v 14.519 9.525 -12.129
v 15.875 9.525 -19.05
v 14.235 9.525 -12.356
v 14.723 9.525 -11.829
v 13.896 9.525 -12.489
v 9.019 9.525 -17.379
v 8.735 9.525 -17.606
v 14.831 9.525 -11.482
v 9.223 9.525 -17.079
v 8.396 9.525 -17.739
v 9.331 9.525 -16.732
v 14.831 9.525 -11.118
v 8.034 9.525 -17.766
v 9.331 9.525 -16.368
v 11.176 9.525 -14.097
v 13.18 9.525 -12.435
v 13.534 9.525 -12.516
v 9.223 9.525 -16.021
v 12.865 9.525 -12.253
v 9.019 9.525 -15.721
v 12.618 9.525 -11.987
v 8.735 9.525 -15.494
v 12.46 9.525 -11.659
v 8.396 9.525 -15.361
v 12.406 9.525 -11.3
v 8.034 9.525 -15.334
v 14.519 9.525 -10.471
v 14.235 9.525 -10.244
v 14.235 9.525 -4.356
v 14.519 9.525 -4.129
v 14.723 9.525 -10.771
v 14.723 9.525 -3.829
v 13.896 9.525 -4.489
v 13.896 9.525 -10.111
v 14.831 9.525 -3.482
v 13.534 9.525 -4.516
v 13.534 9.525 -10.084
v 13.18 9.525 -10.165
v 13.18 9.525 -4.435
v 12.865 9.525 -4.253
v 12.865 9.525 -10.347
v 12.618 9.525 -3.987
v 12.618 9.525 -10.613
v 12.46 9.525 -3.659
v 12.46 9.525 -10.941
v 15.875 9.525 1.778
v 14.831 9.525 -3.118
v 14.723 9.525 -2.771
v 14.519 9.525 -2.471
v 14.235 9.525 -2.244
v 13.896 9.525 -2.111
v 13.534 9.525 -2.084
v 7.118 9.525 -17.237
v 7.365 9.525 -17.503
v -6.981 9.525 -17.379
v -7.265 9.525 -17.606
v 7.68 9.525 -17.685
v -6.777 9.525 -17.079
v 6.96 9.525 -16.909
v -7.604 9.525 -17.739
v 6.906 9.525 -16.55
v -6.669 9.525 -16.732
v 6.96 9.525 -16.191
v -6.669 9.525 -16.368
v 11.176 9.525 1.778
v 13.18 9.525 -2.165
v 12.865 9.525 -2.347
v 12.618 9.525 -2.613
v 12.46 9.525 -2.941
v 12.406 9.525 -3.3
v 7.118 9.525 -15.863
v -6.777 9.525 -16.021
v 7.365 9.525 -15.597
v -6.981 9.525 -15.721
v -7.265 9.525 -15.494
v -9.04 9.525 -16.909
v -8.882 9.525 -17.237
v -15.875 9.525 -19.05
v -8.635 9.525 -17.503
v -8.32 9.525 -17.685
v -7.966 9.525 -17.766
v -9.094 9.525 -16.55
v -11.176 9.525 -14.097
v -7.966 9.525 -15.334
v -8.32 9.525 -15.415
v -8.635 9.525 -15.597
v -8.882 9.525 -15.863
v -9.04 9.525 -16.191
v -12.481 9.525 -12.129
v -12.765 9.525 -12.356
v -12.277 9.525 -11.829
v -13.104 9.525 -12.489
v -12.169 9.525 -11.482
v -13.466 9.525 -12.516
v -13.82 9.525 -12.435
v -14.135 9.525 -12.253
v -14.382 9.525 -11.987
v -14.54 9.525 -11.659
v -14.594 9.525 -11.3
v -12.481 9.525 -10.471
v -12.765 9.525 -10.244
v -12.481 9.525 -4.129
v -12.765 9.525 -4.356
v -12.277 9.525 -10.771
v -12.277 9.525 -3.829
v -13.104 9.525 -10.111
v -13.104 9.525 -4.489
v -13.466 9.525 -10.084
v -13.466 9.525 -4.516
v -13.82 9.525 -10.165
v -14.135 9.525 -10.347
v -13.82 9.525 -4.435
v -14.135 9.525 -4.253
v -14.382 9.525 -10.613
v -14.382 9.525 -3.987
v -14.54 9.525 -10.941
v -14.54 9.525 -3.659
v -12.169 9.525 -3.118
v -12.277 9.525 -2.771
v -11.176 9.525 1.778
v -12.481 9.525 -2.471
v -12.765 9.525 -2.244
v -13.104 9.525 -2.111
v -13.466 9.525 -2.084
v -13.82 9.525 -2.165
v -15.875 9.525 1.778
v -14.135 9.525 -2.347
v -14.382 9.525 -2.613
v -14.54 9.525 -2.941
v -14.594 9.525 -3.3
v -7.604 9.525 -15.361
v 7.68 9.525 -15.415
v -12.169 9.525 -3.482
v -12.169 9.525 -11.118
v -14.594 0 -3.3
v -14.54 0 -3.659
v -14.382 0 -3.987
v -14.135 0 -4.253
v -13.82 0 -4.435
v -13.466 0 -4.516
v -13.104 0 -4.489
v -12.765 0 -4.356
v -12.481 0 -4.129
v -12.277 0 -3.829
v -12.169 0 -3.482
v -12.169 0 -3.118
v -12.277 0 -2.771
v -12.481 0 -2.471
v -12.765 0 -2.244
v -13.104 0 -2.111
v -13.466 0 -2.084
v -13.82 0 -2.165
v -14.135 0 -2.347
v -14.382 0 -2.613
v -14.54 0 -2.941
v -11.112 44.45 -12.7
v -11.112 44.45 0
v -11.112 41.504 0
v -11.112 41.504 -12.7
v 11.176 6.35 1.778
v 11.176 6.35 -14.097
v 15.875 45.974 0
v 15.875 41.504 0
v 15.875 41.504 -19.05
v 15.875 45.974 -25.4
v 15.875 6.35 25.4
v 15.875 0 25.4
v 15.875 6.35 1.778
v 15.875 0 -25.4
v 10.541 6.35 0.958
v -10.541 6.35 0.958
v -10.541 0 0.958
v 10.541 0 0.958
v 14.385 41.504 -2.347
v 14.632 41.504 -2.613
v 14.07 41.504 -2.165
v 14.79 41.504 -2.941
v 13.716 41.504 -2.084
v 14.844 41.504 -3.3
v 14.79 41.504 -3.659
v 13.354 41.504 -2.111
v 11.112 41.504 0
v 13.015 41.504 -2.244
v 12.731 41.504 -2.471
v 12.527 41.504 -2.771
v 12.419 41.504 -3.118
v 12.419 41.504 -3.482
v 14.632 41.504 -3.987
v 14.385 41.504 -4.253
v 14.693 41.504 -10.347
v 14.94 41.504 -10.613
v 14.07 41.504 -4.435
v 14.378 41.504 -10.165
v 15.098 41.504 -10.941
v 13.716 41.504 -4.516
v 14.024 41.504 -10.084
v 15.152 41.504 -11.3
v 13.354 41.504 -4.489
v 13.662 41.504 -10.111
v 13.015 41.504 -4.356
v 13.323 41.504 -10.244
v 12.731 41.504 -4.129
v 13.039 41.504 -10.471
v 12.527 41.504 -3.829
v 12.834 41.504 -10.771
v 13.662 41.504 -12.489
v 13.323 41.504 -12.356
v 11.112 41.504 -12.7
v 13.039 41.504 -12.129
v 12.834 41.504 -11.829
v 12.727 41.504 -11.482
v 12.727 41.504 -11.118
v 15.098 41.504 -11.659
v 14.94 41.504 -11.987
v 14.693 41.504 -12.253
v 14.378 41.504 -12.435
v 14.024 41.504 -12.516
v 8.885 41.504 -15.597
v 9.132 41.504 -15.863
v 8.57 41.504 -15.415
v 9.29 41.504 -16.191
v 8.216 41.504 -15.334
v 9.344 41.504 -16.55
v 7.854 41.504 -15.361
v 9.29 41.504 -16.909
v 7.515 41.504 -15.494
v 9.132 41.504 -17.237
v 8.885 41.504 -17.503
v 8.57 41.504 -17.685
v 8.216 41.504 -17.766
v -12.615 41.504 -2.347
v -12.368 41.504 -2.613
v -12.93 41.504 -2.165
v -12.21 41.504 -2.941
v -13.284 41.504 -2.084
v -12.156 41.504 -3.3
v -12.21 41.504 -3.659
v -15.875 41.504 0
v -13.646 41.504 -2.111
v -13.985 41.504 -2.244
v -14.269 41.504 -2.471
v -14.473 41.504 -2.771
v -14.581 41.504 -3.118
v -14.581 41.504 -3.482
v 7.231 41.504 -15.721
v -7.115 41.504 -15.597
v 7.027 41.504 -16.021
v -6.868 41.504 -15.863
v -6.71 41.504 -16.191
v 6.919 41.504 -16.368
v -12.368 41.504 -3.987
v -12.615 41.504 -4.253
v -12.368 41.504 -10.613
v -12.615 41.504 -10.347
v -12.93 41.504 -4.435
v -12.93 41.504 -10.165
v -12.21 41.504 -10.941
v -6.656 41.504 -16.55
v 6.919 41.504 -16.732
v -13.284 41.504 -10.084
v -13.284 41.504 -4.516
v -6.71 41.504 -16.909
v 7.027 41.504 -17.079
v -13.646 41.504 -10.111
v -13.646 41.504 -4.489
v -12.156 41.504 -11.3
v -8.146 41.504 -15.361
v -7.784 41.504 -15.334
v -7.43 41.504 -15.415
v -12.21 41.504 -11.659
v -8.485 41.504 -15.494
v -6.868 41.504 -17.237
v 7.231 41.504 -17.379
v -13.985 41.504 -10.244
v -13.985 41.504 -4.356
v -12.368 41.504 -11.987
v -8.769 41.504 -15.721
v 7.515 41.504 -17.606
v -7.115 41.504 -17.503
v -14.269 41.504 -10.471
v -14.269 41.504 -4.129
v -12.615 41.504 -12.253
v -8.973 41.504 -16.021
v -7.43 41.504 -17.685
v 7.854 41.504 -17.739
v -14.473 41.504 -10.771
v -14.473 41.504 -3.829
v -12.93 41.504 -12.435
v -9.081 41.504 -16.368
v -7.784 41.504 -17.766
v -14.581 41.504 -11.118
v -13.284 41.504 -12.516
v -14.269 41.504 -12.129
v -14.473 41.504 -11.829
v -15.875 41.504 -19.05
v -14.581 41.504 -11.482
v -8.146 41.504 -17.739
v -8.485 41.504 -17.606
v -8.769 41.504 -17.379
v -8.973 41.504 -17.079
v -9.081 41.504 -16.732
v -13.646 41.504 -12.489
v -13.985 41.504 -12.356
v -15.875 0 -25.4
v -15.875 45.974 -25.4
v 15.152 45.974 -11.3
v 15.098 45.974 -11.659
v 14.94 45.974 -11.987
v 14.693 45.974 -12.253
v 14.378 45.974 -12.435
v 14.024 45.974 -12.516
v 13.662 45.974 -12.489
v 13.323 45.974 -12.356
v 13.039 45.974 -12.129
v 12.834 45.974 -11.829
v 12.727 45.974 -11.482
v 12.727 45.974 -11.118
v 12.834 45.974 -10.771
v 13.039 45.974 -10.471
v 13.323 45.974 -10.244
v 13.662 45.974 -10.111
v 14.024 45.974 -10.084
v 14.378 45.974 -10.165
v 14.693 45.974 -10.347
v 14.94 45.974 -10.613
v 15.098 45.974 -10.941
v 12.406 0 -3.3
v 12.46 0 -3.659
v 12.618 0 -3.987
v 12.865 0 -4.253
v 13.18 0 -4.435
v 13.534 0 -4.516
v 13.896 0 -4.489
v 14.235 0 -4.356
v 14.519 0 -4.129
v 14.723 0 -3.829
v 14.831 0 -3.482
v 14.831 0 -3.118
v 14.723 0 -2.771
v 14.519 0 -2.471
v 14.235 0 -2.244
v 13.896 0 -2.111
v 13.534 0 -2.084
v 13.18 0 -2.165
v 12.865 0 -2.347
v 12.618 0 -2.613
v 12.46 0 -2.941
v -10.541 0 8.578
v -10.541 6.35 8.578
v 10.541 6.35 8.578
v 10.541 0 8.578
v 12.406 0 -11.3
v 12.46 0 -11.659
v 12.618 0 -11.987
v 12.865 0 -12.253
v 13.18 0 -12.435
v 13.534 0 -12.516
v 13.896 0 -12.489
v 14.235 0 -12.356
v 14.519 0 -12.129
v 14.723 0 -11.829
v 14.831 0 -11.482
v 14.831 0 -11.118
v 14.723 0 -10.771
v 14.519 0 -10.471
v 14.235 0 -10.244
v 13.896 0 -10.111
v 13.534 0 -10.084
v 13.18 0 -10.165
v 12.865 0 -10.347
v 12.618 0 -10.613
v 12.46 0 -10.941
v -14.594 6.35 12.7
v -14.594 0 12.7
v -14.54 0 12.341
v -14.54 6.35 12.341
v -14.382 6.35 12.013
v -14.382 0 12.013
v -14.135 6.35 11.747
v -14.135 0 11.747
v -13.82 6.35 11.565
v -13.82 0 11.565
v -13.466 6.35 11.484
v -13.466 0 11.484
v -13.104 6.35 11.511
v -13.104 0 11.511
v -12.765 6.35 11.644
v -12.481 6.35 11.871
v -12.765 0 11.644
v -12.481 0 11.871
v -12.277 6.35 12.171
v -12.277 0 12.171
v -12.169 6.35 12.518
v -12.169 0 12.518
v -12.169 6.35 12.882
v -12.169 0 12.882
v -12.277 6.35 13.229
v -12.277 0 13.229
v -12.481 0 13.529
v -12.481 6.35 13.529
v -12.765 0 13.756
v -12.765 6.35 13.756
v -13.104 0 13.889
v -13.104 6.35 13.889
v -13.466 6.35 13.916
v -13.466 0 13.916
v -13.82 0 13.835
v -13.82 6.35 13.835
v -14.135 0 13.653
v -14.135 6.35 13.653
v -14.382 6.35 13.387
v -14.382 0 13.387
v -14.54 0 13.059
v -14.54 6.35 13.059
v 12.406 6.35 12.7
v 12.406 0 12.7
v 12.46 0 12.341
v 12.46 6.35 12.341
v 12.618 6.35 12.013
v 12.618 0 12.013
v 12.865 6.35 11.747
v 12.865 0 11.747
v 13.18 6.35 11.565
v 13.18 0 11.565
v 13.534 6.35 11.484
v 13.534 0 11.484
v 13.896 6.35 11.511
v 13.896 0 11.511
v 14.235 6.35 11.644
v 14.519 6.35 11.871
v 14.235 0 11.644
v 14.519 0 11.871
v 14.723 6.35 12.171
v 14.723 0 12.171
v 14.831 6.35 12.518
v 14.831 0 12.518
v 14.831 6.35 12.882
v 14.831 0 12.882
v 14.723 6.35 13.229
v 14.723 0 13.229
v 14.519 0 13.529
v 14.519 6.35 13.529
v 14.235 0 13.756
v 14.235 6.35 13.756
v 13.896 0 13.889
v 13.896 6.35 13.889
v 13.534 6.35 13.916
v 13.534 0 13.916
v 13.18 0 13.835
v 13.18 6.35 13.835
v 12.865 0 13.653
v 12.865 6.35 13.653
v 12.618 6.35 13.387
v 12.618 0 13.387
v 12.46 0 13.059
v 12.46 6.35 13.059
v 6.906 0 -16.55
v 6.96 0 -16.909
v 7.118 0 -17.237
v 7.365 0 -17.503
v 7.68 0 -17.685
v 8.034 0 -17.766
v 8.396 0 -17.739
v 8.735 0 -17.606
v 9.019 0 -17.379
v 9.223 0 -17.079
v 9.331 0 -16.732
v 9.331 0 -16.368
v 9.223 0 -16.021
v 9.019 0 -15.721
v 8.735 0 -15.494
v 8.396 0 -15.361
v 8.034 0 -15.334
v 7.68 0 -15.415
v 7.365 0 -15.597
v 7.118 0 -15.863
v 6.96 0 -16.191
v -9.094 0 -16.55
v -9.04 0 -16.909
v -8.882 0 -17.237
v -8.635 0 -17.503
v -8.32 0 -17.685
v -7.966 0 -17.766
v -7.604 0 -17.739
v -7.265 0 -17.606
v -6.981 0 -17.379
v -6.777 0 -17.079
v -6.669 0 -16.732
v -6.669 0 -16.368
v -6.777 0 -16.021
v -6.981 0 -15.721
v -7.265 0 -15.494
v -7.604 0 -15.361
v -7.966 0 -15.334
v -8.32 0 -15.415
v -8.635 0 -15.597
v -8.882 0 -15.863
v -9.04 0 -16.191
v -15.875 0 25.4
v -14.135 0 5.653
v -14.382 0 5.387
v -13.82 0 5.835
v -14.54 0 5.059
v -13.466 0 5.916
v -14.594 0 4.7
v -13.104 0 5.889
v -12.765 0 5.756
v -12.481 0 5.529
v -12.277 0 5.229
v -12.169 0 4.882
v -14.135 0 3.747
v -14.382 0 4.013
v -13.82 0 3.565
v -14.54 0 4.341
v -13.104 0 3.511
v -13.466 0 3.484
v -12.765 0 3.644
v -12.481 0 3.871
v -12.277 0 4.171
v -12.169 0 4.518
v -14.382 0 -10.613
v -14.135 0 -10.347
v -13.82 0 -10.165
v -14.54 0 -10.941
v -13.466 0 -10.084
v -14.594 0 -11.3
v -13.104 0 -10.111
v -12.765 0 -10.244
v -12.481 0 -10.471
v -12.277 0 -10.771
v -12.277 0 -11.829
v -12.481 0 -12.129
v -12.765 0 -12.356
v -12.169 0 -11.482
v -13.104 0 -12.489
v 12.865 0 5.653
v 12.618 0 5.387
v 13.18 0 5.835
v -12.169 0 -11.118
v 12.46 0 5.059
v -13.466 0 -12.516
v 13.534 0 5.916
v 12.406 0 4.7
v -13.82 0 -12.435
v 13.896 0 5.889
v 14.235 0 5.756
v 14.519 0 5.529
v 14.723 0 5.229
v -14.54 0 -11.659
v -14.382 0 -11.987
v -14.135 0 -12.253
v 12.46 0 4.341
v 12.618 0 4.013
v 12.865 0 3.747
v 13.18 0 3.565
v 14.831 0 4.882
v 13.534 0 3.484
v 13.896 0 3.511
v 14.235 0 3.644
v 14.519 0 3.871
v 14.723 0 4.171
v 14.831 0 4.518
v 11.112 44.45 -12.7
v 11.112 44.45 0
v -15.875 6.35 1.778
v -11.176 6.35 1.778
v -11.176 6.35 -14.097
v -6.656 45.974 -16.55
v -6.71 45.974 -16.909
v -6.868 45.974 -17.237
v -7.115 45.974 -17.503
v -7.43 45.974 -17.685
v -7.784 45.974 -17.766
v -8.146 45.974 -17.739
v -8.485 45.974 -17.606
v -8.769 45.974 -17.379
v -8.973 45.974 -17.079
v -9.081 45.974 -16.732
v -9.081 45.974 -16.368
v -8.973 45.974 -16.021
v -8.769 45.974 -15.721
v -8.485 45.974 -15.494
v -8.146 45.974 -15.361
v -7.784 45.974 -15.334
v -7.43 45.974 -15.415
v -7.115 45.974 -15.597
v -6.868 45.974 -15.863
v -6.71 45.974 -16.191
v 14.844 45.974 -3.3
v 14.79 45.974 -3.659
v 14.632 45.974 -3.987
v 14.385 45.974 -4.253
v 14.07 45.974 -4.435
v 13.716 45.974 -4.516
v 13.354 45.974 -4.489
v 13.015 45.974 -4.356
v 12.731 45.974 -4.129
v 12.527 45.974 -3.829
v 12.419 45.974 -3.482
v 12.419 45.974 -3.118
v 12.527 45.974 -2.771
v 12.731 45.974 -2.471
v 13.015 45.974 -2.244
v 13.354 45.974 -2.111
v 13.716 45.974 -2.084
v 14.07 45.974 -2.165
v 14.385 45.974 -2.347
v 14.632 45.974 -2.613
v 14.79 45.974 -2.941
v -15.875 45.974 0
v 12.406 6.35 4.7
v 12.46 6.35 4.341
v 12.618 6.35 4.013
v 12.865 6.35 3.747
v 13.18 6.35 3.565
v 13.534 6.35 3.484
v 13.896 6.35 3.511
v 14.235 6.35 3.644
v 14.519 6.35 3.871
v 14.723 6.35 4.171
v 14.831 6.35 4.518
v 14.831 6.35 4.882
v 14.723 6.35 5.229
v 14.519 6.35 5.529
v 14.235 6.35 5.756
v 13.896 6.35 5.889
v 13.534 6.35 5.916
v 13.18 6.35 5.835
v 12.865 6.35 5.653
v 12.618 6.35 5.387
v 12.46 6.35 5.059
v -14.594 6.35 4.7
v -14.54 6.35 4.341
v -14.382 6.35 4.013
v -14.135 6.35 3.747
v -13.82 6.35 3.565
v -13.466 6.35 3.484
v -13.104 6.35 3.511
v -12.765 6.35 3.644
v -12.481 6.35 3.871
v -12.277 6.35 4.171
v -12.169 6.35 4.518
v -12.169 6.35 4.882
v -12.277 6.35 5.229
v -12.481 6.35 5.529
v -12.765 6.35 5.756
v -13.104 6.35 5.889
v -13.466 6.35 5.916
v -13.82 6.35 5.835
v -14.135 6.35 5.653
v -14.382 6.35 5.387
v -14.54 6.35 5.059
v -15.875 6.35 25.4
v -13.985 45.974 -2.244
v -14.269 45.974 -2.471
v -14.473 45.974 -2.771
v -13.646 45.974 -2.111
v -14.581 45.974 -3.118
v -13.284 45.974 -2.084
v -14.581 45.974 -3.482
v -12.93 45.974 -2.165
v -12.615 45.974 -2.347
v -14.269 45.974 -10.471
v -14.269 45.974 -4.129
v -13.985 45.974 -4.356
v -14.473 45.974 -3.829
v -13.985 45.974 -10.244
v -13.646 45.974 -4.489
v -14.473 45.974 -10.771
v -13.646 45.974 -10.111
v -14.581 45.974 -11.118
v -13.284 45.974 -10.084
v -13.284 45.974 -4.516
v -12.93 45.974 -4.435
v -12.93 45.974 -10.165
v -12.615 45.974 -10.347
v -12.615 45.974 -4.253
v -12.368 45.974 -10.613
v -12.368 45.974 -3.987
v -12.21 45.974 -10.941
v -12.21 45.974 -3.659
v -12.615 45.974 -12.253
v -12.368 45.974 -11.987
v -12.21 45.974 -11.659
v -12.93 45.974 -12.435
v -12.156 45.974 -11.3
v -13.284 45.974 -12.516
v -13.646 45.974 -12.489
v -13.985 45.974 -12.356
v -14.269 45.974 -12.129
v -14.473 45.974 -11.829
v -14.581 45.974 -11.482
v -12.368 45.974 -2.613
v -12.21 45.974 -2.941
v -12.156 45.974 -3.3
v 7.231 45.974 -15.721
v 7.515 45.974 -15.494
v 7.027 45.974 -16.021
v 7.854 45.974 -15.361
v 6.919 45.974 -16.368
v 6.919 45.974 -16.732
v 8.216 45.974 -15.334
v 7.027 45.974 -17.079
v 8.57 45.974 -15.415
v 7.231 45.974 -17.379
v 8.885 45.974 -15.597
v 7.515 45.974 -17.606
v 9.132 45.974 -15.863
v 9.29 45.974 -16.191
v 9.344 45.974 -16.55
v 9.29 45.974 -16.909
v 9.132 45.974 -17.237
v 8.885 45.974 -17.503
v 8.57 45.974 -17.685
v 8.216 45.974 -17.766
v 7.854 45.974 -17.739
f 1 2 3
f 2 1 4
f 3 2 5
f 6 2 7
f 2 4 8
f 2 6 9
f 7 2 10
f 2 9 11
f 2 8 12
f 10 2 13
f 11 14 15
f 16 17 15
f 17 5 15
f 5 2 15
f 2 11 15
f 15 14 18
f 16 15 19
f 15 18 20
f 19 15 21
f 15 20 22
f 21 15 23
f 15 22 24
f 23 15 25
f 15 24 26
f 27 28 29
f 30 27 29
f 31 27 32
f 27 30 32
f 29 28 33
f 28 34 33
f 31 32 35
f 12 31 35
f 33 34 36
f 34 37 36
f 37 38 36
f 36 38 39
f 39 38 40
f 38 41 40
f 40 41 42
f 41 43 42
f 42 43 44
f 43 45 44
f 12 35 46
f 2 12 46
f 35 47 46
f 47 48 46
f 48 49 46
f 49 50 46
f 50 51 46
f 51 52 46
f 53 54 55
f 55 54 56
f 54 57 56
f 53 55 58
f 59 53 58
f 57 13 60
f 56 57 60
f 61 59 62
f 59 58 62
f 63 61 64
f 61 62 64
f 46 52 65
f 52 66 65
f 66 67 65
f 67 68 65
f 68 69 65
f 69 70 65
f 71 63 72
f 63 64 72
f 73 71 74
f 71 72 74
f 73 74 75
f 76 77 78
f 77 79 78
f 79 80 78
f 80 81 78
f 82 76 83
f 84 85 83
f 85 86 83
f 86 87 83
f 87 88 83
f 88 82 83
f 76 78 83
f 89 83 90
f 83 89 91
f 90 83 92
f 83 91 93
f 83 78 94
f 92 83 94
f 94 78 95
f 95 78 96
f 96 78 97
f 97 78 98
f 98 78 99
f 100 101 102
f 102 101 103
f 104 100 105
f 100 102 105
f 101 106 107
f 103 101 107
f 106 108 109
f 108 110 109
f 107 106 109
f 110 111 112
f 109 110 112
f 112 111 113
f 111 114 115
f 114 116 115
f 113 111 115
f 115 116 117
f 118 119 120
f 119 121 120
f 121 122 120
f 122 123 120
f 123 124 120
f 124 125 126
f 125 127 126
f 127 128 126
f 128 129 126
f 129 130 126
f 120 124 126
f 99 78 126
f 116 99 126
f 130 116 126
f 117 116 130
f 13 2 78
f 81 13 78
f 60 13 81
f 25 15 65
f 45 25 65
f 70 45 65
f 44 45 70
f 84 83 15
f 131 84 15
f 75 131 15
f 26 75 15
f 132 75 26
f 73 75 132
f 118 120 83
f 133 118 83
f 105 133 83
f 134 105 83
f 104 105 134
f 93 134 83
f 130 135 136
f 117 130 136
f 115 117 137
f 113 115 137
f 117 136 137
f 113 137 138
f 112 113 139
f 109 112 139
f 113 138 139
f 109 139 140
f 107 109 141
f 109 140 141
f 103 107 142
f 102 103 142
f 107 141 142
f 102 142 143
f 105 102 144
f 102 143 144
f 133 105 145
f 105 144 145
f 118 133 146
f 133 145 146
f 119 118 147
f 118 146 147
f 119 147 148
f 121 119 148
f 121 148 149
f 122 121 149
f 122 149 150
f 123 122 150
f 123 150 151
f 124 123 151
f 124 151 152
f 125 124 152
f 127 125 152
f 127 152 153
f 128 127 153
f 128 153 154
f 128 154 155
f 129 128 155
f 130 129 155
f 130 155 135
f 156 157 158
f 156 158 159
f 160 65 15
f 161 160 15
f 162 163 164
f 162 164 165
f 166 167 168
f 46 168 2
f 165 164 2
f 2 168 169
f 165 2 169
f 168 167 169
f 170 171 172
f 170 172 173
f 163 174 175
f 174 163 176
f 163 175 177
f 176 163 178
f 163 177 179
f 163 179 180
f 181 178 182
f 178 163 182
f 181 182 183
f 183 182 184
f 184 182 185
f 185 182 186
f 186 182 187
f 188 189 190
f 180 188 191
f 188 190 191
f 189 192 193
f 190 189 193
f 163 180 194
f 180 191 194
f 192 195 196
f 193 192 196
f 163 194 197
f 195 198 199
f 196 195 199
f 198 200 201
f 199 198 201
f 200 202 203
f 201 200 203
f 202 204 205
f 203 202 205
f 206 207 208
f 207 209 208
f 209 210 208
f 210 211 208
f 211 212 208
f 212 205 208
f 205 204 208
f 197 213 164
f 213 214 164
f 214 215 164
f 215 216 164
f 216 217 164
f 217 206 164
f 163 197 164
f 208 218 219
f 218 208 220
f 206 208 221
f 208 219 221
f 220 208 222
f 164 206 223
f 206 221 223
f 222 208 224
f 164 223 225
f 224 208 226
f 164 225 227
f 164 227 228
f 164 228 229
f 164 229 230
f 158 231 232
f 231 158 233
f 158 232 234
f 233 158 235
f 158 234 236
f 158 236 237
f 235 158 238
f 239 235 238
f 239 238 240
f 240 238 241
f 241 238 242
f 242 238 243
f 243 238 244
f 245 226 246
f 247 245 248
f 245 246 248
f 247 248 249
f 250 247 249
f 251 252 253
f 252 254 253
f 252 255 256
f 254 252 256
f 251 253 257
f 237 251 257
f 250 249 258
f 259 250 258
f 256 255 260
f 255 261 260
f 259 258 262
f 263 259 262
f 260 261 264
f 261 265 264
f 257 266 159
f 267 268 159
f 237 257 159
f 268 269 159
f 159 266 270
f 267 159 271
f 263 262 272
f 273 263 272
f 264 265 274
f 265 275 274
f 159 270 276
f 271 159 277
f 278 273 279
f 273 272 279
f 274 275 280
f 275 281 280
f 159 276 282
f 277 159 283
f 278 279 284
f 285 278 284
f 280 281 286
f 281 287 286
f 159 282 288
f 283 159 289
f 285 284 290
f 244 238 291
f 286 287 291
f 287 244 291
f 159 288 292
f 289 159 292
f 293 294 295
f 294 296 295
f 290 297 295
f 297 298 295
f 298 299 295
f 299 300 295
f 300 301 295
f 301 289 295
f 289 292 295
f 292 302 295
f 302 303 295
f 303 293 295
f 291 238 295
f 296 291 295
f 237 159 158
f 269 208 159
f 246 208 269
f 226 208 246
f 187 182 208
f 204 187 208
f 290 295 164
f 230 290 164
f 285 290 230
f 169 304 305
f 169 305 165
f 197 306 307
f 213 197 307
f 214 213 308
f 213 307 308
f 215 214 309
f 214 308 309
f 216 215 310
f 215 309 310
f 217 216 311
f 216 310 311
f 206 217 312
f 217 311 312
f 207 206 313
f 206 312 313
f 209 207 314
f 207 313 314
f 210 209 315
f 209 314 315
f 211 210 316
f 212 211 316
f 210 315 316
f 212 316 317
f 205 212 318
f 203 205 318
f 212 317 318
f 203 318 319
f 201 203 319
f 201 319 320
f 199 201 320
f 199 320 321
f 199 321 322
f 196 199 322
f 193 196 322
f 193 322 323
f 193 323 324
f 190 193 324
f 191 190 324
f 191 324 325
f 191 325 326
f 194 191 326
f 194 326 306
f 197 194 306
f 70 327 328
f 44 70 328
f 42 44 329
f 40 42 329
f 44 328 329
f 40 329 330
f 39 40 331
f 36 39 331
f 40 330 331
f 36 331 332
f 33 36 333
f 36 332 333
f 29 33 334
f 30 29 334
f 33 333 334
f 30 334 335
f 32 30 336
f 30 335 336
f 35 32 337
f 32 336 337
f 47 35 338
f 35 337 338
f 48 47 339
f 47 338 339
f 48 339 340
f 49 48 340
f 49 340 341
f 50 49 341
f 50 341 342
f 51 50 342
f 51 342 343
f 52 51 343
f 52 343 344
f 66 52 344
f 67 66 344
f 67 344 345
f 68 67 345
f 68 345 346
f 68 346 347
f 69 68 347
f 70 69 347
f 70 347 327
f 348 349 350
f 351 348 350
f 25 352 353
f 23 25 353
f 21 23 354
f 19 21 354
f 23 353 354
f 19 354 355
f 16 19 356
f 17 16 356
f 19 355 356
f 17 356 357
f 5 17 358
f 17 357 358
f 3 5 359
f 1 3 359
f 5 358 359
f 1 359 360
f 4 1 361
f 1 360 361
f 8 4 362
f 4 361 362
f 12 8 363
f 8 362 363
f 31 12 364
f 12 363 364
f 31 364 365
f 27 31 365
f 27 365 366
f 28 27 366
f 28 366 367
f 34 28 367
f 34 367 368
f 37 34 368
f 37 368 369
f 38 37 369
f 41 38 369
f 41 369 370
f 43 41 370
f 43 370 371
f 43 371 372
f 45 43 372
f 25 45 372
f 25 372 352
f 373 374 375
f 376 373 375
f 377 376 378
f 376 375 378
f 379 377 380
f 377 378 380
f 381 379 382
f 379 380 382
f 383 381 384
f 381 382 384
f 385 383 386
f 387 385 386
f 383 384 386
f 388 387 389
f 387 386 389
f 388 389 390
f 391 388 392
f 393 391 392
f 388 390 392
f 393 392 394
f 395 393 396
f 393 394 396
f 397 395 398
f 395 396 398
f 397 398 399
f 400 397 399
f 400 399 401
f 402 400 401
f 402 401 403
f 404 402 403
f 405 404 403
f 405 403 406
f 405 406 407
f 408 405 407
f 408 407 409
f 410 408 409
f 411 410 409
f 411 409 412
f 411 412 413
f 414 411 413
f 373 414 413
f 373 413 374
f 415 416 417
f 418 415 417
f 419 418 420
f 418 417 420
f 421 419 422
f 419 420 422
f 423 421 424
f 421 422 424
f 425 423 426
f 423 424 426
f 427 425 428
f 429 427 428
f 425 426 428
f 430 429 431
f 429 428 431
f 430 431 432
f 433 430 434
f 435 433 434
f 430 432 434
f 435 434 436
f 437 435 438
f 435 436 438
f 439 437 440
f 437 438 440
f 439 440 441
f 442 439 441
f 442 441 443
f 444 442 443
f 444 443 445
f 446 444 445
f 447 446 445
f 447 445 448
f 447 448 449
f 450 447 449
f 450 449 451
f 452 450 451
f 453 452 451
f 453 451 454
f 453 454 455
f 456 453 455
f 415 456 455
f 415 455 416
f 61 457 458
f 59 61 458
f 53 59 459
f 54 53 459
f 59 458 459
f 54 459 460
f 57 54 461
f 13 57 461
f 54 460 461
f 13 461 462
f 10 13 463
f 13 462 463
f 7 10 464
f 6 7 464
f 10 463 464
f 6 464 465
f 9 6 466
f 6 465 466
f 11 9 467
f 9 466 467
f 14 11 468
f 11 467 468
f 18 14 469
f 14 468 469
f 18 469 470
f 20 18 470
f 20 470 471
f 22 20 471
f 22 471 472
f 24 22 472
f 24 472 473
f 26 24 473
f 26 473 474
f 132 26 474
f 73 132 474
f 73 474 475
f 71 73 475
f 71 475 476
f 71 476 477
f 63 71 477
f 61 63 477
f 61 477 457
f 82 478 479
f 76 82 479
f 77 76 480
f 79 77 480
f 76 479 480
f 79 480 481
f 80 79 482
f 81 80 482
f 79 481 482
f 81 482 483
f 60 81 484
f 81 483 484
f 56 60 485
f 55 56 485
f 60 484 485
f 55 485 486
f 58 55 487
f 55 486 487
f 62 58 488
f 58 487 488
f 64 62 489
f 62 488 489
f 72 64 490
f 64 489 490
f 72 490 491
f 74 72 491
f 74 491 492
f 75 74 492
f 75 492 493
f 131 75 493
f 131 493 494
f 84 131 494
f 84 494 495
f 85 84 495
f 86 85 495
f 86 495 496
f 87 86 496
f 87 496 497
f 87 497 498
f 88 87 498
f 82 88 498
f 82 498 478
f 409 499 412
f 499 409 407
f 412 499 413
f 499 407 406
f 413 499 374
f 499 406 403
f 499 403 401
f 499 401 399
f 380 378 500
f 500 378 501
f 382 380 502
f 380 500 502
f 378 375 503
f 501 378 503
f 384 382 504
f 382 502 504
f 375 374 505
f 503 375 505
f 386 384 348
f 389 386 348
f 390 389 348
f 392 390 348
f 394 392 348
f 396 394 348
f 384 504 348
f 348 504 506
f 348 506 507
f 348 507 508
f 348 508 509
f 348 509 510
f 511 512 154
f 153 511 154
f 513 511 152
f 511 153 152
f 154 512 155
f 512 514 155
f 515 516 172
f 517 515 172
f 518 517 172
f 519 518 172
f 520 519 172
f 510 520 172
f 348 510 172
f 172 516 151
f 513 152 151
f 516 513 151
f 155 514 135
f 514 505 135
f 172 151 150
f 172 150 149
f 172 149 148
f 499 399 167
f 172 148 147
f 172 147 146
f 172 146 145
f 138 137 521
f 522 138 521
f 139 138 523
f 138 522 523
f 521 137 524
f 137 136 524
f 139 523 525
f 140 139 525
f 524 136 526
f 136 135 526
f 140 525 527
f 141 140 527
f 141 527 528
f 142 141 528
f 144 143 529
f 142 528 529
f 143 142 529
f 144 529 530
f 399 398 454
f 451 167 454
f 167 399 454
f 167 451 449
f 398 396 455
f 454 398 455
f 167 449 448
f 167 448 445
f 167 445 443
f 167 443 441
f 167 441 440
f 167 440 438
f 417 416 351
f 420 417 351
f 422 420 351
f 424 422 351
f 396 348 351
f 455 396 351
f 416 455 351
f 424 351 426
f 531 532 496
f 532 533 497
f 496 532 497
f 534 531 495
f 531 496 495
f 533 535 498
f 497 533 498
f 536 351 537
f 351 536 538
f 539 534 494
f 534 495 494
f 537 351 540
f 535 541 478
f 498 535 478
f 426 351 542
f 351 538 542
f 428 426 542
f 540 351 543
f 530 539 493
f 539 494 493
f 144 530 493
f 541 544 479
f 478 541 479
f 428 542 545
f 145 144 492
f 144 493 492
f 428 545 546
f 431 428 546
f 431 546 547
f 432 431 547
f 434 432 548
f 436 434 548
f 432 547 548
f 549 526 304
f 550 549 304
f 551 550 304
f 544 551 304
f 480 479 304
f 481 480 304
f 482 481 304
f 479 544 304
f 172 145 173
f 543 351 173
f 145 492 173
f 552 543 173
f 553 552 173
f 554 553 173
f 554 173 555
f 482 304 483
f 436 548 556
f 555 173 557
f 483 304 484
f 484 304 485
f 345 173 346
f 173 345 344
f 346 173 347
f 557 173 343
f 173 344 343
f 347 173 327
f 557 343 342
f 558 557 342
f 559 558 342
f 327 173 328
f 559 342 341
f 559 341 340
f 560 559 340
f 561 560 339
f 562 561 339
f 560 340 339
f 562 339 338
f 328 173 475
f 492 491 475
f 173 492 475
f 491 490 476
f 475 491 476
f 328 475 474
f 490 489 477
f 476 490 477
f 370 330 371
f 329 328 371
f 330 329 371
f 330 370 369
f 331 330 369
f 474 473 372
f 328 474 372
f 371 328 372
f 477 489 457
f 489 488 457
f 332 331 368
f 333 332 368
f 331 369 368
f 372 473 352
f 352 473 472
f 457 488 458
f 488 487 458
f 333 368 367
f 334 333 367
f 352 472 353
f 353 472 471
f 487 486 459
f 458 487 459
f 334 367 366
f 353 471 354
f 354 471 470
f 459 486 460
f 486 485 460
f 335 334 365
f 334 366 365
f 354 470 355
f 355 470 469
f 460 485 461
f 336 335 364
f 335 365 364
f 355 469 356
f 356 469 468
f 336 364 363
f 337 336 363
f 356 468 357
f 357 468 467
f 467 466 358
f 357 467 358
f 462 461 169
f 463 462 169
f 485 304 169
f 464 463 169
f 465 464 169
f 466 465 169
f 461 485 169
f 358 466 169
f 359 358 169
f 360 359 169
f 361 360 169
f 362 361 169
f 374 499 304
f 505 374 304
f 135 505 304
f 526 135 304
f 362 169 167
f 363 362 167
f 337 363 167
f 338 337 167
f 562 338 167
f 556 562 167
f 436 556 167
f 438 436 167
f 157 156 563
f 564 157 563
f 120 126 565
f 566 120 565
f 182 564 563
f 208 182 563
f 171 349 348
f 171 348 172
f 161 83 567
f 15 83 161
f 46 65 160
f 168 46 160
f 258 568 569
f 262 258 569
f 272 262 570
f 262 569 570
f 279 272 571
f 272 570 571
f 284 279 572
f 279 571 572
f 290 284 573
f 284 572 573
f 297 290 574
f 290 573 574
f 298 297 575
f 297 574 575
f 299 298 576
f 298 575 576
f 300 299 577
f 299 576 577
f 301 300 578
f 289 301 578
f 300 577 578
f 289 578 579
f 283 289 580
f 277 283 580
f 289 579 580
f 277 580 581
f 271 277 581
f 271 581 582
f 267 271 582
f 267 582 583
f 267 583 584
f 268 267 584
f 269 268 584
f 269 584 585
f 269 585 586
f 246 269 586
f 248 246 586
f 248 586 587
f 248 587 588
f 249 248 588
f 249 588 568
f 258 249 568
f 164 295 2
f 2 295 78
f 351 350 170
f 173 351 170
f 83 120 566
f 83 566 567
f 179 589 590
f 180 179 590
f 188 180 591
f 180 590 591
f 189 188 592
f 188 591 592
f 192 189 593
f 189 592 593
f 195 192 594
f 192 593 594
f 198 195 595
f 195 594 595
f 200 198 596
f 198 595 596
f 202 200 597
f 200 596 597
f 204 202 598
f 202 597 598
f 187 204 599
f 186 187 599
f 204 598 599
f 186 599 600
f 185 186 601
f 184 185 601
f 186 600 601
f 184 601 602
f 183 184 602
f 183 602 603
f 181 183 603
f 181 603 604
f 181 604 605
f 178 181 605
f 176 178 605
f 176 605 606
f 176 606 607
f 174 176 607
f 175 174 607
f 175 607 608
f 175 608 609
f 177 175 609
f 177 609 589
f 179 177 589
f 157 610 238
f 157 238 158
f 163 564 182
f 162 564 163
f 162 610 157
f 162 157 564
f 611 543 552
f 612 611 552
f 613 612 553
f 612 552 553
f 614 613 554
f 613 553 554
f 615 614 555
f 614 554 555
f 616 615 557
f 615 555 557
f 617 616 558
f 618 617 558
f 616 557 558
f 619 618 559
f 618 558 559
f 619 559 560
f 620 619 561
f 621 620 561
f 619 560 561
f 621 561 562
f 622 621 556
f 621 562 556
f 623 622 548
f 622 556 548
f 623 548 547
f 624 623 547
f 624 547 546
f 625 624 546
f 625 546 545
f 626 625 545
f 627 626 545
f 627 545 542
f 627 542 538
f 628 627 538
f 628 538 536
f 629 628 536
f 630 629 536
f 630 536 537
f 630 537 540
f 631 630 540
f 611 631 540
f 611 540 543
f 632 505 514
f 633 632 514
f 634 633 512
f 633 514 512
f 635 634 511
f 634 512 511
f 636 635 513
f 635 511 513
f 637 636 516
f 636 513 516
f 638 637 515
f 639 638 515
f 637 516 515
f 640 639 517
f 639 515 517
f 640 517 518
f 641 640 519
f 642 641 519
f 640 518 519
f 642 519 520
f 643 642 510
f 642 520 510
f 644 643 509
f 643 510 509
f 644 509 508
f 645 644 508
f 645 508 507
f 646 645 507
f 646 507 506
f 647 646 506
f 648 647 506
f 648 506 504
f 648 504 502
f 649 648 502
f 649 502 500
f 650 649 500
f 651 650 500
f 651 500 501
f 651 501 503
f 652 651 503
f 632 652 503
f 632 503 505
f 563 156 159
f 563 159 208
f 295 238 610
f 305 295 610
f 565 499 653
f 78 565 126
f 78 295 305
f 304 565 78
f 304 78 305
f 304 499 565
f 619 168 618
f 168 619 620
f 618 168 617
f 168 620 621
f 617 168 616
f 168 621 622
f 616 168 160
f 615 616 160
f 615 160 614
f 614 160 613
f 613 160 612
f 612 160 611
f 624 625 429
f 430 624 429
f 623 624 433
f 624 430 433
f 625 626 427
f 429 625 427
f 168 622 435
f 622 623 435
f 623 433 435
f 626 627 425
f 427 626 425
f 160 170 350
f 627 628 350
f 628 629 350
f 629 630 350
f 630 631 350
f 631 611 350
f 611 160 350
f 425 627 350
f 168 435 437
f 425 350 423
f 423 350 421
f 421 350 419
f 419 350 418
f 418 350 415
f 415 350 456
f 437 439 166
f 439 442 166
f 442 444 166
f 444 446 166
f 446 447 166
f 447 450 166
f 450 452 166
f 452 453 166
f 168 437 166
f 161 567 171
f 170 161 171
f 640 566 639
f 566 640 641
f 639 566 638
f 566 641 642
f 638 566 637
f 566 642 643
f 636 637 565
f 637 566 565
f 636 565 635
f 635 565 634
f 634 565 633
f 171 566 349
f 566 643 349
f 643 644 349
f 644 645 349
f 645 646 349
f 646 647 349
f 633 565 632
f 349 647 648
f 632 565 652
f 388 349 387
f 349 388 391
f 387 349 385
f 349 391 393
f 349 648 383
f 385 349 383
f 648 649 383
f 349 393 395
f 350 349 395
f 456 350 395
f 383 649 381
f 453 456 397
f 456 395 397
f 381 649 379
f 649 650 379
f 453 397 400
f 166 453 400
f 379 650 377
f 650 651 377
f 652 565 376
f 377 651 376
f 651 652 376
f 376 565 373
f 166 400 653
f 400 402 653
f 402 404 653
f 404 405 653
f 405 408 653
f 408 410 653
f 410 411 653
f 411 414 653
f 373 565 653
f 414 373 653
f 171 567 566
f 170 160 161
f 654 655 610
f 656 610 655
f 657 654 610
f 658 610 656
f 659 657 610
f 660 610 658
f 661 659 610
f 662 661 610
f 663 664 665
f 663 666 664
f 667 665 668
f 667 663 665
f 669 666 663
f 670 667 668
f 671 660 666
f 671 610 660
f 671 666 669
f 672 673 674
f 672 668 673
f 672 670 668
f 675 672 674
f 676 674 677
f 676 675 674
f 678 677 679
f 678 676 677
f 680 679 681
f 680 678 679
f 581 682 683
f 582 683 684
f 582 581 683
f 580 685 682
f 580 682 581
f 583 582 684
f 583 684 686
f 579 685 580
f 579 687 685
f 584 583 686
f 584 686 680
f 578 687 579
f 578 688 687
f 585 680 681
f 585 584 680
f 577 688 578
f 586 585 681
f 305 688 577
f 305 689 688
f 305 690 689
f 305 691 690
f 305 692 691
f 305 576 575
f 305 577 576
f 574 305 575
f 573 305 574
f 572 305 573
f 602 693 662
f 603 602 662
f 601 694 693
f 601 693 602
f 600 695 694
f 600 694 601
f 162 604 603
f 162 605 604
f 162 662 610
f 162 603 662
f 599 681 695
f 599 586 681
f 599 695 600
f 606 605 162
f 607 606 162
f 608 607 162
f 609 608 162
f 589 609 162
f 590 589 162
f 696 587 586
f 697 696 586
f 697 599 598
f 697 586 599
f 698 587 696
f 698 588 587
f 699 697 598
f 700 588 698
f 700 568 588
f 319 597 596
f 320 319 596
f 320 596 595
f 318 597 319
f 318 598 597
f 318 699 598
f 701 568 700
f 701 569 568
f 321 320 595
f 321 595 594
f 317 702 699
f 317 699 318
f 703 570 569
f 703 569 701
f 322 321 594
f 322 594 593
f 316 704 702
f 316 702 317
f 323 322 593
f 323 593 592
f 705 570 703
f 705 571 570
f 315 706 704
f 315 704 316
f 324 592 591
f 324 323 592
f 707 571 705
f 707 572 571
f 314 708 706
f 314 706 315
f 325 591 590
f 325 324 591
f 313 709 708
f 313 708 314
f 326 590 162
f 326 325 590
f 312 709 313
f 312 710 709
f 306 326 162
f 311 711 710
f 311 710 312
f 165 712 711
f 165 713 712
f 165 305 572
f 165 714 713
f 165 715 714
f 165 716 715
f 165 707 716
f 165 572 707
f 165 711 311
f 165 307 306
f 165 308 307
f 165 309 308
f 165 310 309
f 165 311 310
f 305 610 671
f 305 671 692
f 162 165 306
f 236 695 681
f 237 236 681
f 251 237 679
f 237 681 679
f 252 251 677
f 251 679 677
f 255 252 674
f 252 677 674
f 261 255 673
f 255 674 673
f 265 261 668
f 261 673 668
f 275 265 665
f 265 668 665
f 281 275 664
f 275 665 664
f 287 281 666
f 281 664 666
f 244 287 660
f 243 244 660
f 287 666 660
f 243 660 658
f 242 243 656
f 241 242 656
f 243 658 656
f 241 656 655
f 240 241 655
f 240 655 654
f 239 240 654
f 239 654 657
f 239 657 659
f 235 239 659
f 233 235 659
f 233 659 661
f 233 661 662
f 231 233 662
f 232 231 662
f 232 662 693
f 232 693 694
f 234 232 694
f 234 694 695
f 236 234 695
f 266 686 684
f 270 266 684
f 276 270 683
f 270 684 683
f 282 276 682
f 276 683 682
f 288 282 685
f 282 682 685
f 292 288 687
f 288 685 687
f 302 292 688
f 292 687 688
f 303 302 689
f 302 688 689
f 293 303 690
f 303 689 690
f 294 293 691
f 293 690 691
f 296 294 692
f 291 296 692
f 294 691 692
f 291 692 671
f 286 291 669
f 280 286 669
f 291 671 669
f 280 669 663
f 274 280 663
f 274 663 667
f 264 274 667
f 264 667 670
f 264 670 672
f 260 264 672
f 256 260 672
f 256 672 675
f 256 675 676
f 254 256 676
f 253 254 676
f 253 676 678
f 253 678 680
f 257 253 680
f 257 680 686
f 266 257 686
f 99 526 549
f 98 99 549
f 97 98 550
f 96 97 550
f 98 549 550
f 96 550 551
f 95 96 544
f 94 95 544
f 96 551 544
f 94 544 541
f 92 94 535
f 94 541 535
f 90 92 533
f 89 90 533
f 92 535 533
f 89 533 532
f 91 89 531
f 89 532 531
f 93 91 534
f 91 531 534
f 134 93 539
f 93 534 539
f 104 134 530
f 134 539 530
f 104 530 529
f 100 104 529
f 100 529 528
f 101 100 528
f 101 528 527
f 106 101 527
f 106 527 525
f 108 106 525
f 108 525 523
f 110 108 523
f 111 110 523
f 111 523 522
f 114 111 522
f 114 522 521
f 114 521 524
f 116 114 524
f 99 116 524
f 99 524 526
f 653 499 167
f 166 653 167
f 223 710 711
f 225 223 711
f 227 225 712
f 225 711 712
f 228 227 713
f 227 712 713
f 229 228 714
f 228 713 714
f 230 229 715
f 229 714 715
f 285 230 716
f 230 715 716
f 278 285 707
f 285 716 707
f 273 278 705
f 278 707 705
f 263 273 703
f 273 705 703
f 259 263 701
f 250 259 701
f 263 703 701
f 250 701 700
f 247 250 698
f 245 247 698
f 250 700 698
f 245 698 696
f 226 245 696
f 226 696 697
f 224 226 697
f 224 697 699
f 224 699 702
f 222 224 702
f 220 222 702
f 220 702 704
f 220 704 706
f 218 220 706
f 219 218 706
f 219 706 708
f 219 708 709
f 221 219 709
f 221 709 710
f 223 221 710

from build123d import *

# Parameters (mm, degrees)
SKETCH1_W                 = 31.75
SKETCH1_H                 = 50.8
BOSS_EXTRUDE1_DEPTH       = 45.974
CUT_EXTRUDE1_DEPTH        = 32.75
SKETCH3_W                 = 22.352
SKETCH3_H                 = 15.875
CUT_EXTRUDE2_DEPTH        = 3.175
SKETCH4_W                 = 31.75
SKETCH4_H                 = 25.4
CUT_EXTRUDE3_DEPTH        = 4.4704
CUT_EXTRUDE4_START        = -1.524
SKETCH5_W                 = 22.225
SKETCH5_H                 = 12.7
CUT_EXTRUDE4_DEPTH        = 2.9464
F_2_CLEARANCE_HOLE1_D     = 2.4384
F_2_CLEARANCE_HOLE1_DEPTH = 9.525
F_2_CLEARANCE_HOLE2_D     = 2.4384
F_2_CLEARANCE_HOLE2_DEPTH = 4.4704
SKETCH10_W                = 21.082
SKETCH10_H                = 7.62
CUT_EXTRUDE5_DEPTH        = 6.35
F_2_CLEARANCE_HOLE3_D     = 2.4384


with BuildPart() as part:
    # Sketch1 → Boss-Extrude1 (new body)
    with BuildSketch(Plane(origin=(0, 0, 0), x_dir=(1, 0, 0), z_dir=(0, 1, 0))):
        Rectangle(SKETCH1_W, SKETCH1_H)
    extrude(amount=BOSS_EXTRUDE1_DEPTH)

    # Sketch2 → Cut-Extrude1 (cut, through all)
    with BuildSketch(Plane.ZY.offset(15.875)):
        Polygon((1.778, 6.35), (25.4, 6.35), (25.4, 41.5036), (-19.05, 41.5036), (-19.05, 9.525), (1.778, 9.525), align=None)
    extrude(amount=-CUT_EXTRUDE1_DEPTH, mode=Mode.SUBTRACT)

    # Sketch3 → Cut-Extrude2 (cut)
    with BuildSketch(Plane(origin=(0, 9.525, 0), x_dir=(1, 0, 0), z_dir=(0, 1, 0))):
        with Locations((0, 6.1595)):
            Rectangle(SKETCH3_W, SKETCH3_H)
    extrude(amount=-CUT_EXTRUDE2_DEPTH, mode=Mode.SUBTRACT)

    # Sketch4 → Cut-Extrude3 (cut)
    with BuildSketch(Plane(origin=(0, 45.974, 0), x_dir=(1, 0, 0), z_dir=(0, 1, 0))):
        with Locations((0, -12.7)):
            Rectangle(SKETCH4_W, SKETCH4_H)
    extrude(amount=-CUT_EXTRUDE3_DEPTH, mode=Mode.SUBTRACT)

    # Sketch5 → Cut-Extrude4 (cut)
    with BuildSketch(Plane(origin=(0, 45.974, 0), x_dir=(1, 0, 0), z_dir=(0, 1, 0)).offset(CUT_EXTRUDE4_START)):
        with Locations((0, 6.35)):
            Rectangle(SKETCH5_W, SKETCH5_H)
    extrude(amount=-CUT_EXTRUDE4_DEPTH, mode=Mode.SUBTRACT)

    # #2 Clearance Hole1
    with Locations(Plane(origin=(0, 9.525, 0), x_dir=(1, 0, 0), z_dir=(0, 1, 0))):
        with Locations((-13.375, 11.3), (-13.375, 3.3), (-7.875, 16.55), (8.125, 16.55), (13.625, 3.3), (13.625, 11.3)):
            Hole(F_2_CLEARANCE_HOLE1_D / 2, depth=F_2_CLEARANCE_HOLE1_DEPTH)

    # #2 Clearance Hole2
    with Locations(Plane(origin=(0, 41.5036, 0), x_dir=(-1, 0, 0), z_dir=(0, -1, 0))):
        with Locations((13.375, 11.3), (7.875, 16.55), (-8.125, 16.55), (-13.932840587, 11.3), (-13.625, 3.3), (13.375, 3.3)):
            Hole(F_2_CLEARANCE_HOLE2_D / 2, depth=F_2_CLEARANCE_HOLE2_DEPTH)

    # Sketch10 → Cut-Extrude5 (cut)
    with BuildSketch(Plane(origin=(0, 6.35, 0), x_dir=(1, 0, 0), z_dir=(0, 1, 0))):
        with Locations((0, -4.767798325)):
            Rectangle(SKETCH10_W, SKETCH10_H)
    extrude(amount=-CUT_EXTRUDE5_DEPTH, mode=Mode.SUBTRACT)

    # #2 Clearance Hole3 (through all)
    with Locations(Plane(origin=(0, 6.35, 0), x_dir=(1, 0, 0), z_dir=(0, 1, 0))):
        with Locations((-13.375, -4.7), (-13.375, -12.7), (13.625, -12.7), (13.625, -4.7)):
            Hole(F_2_CLEARANCE_HOLE3_D / 2)


solid = part.part
